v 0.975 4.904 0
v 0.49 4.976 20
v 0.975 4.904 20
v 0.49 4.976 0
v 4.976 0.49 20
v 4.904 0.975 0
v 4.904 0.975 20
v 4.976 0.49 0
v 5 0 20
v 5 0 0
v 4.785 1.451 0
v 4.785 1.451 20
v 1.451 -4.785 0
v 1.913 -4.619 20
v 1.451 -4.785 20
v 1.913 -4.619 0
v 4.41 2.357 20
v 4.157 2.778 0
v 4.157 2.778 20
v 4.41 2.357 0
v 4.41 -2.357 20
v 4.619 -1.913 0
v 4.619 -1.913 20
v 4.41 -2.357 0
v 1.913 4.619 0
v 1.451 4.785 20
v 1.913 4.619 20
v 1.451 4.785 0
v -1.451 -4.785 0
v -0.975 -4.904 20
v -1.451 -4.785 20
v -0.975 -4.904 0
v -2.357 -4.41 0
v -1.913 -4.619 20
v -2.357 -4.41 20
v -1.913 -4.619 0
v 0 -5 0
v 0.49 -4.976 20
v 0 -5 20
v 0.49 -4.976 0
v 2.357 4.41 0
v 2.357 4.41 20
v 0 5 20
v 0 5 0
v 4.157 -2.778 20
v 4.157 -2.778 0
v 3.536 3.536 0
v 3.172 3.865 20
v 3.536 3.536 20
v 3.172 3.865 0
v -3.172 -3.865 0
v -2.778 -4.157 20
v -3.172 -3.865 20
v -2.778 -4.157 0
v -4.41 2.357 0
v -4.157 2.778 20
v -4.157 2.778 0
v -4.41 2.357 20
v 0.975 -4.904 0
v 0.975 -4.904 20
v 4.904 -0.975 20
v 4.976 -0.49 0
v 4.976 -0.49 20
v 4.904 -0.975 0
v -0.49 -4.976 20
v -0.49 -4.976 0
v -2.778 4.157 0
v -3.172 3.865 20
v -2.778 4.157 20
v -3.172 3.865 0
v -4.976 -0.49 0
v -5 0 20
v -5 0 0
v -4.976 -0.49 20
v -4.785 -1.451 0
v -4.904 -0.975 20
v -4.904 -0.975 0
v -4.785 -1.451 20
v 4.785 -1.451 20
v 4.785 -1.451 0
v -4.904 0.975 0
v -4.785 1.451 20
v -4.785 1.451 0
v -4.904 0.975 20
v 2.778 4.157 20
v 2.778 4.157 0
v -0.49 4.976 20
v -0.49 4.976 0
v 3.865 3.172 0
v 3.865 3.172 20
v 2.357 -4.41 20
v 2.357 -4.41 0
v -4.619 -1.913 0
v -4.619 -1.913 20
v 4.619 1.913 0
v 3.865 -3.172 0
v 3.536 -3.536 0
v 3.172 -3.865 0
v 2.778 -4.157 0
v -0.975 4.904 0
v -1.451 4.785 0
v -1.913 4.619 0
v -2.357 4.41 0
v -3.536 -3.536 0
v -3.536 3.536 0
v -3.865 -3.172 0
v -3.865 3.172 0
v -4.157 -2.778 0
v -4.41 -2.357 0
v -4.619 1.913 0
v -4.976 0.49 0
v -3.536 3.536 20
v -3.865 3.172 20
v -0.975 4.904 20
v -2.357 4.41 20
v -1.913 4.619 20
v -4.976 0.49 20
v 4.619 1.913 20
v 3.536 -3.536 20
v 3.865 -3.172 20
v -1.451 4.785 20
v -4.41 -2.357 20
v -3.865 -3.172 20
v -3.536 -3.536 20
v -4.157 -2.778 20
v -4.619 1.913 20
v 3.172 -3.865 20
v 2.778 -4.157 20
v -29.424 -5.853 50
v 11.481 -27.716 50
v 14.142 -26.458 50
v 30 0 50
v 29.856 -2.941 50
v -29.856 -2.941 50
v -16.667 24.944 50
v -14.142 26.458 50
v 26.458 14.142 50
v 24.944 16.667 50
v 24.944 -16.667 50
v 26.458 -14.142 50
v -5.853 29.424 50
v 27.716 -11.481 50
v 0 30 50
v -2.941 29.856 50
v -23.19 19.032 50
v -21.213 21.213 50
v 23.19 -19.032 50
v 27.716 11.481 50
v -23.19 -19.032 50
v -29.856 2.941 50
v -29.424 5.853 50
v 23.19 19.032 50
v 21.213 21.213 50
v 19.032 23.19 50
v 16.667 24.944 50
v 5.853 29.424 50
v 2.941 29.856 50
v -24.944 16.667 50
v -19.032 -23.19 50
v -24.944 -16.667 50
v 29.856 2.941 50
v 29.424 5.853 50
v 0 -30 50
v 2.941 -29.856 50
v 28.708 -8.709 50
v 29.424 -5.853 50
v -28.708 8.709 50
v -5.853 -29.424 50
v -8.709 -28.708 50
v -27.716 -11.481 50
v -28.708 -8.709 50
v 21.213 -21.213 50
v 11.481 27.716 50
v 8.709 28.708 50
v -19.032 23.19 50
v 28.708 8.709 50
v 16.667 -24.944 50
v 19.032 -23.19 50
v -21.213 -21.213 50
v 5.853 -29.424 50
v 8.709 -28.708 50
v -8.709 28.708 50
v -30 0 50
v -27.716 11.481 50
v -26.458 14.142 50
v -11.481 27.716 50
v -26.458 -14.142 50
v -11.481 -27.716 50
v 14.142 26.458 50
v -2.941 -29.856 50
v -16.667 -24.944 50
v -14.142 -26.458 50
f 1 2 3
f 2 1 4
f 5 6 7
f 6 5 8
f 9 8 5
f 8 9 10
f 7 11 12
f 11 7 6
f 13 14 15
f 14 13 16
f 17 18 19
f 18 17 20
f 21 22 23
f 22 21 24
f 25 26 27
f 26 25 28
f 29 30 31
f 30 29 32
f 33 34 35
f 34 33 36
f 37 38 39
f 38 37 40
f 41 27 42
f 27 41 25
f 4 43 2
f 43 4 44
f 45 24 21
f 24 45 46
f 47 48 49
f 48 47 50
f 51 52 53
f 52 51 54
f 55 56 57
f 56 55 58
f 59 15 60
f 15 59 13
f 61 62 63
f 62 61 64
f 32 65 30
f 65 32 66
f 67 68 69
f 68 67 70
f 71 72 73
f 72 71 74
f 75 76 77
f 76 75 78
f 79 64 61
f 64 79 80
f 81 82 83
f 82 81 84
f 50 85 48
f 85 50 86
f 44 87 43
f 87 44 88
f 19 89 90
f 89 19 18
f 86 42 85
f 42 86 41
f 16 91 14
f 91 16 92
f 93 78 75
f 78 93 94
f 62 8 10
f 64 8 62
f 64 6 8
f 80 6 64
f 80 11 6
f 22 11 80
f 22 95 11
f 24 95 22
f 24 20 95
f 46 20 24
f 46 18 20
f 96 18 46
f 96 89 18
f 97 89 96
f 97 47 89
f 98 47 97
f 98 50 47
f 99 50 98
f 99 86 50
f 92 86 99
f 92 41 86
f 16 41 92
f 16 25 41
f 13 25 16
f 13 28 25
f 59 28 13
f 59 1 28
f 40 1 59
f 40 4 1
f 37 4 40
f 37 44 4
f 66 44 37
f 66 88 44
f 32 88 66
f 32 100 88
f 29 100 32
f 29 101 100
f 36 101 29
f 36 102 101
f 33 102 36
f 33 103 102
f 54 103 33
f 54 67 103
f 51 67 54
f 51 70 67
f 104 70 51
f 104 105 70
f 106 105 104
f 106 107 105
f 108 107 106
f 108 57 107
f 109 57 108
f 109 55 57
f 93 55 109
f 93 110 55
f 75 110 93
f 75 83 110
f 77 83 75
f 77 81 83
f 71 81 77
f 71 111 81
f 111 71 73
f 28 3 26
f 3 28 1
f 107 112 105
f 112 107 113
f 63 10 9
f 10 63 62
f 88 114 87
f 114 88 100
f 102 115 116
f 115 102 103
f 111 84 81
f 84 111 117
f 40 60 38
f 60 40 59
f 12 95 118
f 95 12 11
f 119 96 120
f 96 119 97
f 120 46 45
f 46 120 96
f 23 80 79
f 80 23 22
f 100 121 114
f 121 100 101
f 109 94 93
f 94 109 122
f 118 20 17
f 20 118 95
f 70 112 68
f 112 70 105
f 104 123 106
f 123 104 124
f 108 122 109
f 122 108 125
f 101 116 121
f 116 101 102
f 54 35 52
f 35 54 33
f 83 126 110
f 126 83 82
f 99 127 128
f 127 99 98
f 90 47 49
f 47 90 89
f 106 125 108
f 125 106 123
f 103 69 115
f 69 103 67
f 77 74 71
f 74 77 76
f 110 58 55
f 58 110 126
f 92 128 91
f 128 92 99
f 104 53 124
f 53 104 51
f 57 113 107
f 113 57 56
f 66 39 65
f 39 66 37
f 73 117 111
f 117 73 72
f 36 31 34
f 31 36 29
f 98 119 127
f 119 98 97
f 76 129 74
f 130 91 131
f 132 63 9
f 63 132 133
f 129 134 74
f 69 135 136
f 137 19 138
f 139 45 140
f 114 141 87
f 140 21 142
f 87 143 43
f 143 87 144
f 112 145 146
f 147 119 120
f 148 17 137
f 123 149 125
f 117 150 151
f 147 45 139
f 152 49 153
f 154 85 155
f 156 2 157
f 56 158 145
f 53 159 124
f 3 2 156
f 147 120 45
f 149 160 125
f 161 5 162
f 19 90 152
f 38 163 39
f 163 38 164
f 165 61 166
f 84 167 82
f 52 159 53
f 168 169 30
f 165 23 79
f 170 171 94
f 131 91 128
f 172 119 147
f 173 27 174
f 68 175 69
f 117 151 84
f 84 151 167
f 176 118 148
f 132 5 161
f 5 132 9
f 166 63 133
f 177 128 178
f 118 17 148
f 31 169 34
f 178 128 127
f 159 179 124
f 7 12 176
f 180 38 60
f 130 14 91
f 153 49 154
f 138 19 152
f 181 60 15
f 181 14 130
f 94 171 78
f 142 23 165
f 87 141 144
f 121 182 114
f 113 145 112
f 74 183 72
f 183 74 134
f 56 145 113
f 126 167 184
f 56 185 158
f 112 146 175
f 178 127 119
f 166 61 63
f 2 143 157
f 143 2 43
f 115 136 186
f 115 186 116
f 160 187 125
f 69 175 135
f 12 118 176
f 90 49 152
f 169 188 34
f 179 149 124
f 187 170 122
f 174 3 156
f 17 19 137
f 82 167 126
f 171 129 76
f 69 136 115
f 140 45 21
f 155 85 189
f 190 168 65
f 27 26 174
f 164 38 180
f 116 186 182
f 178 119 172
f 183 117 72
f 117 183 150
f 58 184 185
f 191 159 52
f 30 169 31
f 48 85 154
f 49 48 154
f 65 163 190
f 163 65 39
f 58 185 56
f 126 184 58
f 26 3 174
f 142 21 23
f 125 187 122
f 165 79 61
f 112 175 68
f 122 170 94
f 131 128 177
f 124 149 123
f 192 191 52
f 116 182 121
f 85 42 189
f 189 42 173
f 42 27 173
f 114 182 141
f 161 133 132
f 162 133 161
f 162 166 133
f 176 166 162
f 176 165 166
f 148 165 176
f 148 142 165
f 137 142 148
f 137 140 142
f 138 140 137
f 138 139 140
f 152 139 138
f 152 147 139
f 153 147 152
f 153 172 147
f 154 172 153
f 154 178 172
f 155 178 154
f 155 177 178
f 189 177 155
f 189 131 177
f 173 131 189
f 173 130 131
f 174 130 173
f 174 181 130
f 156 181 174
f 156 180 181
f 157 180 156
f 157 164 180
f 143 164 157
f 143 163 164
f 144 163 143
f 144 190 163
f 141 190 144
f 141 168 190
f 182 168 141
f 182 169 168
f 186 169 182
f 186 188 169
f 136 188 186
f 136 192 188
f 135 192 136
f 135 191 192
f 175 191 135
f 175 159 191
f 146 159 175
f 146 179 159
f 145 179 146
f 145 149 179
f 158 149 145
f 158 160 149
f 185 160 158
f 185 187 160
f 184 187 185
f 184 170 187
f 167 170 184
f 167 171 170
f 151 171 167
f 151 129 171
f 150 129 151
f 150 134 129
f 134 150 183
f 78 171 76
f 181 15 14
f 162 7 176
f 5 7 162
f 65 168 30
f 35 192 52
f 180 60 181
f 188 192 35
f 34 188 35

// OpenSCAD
// Lab Funnel Design
// Units: mm

// Dimensions
funnel_height = 50;       // Total height from bottom to rim
spout_height = 20;        // Height of the straight tube section
spout_od = 10;            // Outer diameter of the spout
funnel_od_top = 60;       // Outer diameter at the rim
wall_thickness = 1.6;     // Wall thickness of the funnel
$fn = 64;                 // Resolution for curved surfaces

// Derived Dimensions
funnel_od_bottom = spout_od + (wall_thickness * 2); // Outer diameter at z=20
funnel_id_top = funnel_od_top - (wall_thickness * 2); // Inner diameter at rim
funnel_id_bottom = funnel_od_bottom - (wall_thickness * 2); // Inner diameter at z=20
spout_id = spout_od - (wall_thickness * 2); // Inner diameter of spout

// Geometry
module funnel() {
    // 1. Straight Spout (Cylinder)
    // Extruded from z=0 to z=20
    cylinder(
        h = spout_height,
        r1 = spout_od / 2,
        r2 = spout_od / 2,
        $fn = $fn
    );

    // 2. Funnel Cone
    // Extruded from z=20 to z=50
    // We use a linear interpolation of the radius
    // At z=20: radius = spout_od/2
    // At z=50: radius = funnel_od_top/2
    // Height of cone section = 30
    translate([0, 0, spout_height]) {
        cylinder(
            h = funnel_height - spout_height,
            r1 = spout_od / 2,
            r2 = funnel_od_top / 2,
            $fn = $fn
        );
    }
}

module cutouts() {
    // 1. Bottom Cutout (Spout Bore)
    // Extends slightly past z=0 to ensure clean separation
    cylinder(
        h = 0.1,
        r = spout_id / 2,
        $fn = $fn
    );

    // 2. Top Cutout (Funnel Bore)
    // Extends slightly past z=50 to ensure clean separation
    translate([0, 0, funnel_height - 0.1]) {
        cylinder(
            h = 0.1,
            r = funnel_id_top / 2,
            $fn = $fn
        );
    }
}

// Render
// Union creates the solid material
// Difference subtracts the voids
union() {
    funnel();
    difference() {
        // The solid shape
        funnel();
        // The voids
        cutouts();
    }
}
